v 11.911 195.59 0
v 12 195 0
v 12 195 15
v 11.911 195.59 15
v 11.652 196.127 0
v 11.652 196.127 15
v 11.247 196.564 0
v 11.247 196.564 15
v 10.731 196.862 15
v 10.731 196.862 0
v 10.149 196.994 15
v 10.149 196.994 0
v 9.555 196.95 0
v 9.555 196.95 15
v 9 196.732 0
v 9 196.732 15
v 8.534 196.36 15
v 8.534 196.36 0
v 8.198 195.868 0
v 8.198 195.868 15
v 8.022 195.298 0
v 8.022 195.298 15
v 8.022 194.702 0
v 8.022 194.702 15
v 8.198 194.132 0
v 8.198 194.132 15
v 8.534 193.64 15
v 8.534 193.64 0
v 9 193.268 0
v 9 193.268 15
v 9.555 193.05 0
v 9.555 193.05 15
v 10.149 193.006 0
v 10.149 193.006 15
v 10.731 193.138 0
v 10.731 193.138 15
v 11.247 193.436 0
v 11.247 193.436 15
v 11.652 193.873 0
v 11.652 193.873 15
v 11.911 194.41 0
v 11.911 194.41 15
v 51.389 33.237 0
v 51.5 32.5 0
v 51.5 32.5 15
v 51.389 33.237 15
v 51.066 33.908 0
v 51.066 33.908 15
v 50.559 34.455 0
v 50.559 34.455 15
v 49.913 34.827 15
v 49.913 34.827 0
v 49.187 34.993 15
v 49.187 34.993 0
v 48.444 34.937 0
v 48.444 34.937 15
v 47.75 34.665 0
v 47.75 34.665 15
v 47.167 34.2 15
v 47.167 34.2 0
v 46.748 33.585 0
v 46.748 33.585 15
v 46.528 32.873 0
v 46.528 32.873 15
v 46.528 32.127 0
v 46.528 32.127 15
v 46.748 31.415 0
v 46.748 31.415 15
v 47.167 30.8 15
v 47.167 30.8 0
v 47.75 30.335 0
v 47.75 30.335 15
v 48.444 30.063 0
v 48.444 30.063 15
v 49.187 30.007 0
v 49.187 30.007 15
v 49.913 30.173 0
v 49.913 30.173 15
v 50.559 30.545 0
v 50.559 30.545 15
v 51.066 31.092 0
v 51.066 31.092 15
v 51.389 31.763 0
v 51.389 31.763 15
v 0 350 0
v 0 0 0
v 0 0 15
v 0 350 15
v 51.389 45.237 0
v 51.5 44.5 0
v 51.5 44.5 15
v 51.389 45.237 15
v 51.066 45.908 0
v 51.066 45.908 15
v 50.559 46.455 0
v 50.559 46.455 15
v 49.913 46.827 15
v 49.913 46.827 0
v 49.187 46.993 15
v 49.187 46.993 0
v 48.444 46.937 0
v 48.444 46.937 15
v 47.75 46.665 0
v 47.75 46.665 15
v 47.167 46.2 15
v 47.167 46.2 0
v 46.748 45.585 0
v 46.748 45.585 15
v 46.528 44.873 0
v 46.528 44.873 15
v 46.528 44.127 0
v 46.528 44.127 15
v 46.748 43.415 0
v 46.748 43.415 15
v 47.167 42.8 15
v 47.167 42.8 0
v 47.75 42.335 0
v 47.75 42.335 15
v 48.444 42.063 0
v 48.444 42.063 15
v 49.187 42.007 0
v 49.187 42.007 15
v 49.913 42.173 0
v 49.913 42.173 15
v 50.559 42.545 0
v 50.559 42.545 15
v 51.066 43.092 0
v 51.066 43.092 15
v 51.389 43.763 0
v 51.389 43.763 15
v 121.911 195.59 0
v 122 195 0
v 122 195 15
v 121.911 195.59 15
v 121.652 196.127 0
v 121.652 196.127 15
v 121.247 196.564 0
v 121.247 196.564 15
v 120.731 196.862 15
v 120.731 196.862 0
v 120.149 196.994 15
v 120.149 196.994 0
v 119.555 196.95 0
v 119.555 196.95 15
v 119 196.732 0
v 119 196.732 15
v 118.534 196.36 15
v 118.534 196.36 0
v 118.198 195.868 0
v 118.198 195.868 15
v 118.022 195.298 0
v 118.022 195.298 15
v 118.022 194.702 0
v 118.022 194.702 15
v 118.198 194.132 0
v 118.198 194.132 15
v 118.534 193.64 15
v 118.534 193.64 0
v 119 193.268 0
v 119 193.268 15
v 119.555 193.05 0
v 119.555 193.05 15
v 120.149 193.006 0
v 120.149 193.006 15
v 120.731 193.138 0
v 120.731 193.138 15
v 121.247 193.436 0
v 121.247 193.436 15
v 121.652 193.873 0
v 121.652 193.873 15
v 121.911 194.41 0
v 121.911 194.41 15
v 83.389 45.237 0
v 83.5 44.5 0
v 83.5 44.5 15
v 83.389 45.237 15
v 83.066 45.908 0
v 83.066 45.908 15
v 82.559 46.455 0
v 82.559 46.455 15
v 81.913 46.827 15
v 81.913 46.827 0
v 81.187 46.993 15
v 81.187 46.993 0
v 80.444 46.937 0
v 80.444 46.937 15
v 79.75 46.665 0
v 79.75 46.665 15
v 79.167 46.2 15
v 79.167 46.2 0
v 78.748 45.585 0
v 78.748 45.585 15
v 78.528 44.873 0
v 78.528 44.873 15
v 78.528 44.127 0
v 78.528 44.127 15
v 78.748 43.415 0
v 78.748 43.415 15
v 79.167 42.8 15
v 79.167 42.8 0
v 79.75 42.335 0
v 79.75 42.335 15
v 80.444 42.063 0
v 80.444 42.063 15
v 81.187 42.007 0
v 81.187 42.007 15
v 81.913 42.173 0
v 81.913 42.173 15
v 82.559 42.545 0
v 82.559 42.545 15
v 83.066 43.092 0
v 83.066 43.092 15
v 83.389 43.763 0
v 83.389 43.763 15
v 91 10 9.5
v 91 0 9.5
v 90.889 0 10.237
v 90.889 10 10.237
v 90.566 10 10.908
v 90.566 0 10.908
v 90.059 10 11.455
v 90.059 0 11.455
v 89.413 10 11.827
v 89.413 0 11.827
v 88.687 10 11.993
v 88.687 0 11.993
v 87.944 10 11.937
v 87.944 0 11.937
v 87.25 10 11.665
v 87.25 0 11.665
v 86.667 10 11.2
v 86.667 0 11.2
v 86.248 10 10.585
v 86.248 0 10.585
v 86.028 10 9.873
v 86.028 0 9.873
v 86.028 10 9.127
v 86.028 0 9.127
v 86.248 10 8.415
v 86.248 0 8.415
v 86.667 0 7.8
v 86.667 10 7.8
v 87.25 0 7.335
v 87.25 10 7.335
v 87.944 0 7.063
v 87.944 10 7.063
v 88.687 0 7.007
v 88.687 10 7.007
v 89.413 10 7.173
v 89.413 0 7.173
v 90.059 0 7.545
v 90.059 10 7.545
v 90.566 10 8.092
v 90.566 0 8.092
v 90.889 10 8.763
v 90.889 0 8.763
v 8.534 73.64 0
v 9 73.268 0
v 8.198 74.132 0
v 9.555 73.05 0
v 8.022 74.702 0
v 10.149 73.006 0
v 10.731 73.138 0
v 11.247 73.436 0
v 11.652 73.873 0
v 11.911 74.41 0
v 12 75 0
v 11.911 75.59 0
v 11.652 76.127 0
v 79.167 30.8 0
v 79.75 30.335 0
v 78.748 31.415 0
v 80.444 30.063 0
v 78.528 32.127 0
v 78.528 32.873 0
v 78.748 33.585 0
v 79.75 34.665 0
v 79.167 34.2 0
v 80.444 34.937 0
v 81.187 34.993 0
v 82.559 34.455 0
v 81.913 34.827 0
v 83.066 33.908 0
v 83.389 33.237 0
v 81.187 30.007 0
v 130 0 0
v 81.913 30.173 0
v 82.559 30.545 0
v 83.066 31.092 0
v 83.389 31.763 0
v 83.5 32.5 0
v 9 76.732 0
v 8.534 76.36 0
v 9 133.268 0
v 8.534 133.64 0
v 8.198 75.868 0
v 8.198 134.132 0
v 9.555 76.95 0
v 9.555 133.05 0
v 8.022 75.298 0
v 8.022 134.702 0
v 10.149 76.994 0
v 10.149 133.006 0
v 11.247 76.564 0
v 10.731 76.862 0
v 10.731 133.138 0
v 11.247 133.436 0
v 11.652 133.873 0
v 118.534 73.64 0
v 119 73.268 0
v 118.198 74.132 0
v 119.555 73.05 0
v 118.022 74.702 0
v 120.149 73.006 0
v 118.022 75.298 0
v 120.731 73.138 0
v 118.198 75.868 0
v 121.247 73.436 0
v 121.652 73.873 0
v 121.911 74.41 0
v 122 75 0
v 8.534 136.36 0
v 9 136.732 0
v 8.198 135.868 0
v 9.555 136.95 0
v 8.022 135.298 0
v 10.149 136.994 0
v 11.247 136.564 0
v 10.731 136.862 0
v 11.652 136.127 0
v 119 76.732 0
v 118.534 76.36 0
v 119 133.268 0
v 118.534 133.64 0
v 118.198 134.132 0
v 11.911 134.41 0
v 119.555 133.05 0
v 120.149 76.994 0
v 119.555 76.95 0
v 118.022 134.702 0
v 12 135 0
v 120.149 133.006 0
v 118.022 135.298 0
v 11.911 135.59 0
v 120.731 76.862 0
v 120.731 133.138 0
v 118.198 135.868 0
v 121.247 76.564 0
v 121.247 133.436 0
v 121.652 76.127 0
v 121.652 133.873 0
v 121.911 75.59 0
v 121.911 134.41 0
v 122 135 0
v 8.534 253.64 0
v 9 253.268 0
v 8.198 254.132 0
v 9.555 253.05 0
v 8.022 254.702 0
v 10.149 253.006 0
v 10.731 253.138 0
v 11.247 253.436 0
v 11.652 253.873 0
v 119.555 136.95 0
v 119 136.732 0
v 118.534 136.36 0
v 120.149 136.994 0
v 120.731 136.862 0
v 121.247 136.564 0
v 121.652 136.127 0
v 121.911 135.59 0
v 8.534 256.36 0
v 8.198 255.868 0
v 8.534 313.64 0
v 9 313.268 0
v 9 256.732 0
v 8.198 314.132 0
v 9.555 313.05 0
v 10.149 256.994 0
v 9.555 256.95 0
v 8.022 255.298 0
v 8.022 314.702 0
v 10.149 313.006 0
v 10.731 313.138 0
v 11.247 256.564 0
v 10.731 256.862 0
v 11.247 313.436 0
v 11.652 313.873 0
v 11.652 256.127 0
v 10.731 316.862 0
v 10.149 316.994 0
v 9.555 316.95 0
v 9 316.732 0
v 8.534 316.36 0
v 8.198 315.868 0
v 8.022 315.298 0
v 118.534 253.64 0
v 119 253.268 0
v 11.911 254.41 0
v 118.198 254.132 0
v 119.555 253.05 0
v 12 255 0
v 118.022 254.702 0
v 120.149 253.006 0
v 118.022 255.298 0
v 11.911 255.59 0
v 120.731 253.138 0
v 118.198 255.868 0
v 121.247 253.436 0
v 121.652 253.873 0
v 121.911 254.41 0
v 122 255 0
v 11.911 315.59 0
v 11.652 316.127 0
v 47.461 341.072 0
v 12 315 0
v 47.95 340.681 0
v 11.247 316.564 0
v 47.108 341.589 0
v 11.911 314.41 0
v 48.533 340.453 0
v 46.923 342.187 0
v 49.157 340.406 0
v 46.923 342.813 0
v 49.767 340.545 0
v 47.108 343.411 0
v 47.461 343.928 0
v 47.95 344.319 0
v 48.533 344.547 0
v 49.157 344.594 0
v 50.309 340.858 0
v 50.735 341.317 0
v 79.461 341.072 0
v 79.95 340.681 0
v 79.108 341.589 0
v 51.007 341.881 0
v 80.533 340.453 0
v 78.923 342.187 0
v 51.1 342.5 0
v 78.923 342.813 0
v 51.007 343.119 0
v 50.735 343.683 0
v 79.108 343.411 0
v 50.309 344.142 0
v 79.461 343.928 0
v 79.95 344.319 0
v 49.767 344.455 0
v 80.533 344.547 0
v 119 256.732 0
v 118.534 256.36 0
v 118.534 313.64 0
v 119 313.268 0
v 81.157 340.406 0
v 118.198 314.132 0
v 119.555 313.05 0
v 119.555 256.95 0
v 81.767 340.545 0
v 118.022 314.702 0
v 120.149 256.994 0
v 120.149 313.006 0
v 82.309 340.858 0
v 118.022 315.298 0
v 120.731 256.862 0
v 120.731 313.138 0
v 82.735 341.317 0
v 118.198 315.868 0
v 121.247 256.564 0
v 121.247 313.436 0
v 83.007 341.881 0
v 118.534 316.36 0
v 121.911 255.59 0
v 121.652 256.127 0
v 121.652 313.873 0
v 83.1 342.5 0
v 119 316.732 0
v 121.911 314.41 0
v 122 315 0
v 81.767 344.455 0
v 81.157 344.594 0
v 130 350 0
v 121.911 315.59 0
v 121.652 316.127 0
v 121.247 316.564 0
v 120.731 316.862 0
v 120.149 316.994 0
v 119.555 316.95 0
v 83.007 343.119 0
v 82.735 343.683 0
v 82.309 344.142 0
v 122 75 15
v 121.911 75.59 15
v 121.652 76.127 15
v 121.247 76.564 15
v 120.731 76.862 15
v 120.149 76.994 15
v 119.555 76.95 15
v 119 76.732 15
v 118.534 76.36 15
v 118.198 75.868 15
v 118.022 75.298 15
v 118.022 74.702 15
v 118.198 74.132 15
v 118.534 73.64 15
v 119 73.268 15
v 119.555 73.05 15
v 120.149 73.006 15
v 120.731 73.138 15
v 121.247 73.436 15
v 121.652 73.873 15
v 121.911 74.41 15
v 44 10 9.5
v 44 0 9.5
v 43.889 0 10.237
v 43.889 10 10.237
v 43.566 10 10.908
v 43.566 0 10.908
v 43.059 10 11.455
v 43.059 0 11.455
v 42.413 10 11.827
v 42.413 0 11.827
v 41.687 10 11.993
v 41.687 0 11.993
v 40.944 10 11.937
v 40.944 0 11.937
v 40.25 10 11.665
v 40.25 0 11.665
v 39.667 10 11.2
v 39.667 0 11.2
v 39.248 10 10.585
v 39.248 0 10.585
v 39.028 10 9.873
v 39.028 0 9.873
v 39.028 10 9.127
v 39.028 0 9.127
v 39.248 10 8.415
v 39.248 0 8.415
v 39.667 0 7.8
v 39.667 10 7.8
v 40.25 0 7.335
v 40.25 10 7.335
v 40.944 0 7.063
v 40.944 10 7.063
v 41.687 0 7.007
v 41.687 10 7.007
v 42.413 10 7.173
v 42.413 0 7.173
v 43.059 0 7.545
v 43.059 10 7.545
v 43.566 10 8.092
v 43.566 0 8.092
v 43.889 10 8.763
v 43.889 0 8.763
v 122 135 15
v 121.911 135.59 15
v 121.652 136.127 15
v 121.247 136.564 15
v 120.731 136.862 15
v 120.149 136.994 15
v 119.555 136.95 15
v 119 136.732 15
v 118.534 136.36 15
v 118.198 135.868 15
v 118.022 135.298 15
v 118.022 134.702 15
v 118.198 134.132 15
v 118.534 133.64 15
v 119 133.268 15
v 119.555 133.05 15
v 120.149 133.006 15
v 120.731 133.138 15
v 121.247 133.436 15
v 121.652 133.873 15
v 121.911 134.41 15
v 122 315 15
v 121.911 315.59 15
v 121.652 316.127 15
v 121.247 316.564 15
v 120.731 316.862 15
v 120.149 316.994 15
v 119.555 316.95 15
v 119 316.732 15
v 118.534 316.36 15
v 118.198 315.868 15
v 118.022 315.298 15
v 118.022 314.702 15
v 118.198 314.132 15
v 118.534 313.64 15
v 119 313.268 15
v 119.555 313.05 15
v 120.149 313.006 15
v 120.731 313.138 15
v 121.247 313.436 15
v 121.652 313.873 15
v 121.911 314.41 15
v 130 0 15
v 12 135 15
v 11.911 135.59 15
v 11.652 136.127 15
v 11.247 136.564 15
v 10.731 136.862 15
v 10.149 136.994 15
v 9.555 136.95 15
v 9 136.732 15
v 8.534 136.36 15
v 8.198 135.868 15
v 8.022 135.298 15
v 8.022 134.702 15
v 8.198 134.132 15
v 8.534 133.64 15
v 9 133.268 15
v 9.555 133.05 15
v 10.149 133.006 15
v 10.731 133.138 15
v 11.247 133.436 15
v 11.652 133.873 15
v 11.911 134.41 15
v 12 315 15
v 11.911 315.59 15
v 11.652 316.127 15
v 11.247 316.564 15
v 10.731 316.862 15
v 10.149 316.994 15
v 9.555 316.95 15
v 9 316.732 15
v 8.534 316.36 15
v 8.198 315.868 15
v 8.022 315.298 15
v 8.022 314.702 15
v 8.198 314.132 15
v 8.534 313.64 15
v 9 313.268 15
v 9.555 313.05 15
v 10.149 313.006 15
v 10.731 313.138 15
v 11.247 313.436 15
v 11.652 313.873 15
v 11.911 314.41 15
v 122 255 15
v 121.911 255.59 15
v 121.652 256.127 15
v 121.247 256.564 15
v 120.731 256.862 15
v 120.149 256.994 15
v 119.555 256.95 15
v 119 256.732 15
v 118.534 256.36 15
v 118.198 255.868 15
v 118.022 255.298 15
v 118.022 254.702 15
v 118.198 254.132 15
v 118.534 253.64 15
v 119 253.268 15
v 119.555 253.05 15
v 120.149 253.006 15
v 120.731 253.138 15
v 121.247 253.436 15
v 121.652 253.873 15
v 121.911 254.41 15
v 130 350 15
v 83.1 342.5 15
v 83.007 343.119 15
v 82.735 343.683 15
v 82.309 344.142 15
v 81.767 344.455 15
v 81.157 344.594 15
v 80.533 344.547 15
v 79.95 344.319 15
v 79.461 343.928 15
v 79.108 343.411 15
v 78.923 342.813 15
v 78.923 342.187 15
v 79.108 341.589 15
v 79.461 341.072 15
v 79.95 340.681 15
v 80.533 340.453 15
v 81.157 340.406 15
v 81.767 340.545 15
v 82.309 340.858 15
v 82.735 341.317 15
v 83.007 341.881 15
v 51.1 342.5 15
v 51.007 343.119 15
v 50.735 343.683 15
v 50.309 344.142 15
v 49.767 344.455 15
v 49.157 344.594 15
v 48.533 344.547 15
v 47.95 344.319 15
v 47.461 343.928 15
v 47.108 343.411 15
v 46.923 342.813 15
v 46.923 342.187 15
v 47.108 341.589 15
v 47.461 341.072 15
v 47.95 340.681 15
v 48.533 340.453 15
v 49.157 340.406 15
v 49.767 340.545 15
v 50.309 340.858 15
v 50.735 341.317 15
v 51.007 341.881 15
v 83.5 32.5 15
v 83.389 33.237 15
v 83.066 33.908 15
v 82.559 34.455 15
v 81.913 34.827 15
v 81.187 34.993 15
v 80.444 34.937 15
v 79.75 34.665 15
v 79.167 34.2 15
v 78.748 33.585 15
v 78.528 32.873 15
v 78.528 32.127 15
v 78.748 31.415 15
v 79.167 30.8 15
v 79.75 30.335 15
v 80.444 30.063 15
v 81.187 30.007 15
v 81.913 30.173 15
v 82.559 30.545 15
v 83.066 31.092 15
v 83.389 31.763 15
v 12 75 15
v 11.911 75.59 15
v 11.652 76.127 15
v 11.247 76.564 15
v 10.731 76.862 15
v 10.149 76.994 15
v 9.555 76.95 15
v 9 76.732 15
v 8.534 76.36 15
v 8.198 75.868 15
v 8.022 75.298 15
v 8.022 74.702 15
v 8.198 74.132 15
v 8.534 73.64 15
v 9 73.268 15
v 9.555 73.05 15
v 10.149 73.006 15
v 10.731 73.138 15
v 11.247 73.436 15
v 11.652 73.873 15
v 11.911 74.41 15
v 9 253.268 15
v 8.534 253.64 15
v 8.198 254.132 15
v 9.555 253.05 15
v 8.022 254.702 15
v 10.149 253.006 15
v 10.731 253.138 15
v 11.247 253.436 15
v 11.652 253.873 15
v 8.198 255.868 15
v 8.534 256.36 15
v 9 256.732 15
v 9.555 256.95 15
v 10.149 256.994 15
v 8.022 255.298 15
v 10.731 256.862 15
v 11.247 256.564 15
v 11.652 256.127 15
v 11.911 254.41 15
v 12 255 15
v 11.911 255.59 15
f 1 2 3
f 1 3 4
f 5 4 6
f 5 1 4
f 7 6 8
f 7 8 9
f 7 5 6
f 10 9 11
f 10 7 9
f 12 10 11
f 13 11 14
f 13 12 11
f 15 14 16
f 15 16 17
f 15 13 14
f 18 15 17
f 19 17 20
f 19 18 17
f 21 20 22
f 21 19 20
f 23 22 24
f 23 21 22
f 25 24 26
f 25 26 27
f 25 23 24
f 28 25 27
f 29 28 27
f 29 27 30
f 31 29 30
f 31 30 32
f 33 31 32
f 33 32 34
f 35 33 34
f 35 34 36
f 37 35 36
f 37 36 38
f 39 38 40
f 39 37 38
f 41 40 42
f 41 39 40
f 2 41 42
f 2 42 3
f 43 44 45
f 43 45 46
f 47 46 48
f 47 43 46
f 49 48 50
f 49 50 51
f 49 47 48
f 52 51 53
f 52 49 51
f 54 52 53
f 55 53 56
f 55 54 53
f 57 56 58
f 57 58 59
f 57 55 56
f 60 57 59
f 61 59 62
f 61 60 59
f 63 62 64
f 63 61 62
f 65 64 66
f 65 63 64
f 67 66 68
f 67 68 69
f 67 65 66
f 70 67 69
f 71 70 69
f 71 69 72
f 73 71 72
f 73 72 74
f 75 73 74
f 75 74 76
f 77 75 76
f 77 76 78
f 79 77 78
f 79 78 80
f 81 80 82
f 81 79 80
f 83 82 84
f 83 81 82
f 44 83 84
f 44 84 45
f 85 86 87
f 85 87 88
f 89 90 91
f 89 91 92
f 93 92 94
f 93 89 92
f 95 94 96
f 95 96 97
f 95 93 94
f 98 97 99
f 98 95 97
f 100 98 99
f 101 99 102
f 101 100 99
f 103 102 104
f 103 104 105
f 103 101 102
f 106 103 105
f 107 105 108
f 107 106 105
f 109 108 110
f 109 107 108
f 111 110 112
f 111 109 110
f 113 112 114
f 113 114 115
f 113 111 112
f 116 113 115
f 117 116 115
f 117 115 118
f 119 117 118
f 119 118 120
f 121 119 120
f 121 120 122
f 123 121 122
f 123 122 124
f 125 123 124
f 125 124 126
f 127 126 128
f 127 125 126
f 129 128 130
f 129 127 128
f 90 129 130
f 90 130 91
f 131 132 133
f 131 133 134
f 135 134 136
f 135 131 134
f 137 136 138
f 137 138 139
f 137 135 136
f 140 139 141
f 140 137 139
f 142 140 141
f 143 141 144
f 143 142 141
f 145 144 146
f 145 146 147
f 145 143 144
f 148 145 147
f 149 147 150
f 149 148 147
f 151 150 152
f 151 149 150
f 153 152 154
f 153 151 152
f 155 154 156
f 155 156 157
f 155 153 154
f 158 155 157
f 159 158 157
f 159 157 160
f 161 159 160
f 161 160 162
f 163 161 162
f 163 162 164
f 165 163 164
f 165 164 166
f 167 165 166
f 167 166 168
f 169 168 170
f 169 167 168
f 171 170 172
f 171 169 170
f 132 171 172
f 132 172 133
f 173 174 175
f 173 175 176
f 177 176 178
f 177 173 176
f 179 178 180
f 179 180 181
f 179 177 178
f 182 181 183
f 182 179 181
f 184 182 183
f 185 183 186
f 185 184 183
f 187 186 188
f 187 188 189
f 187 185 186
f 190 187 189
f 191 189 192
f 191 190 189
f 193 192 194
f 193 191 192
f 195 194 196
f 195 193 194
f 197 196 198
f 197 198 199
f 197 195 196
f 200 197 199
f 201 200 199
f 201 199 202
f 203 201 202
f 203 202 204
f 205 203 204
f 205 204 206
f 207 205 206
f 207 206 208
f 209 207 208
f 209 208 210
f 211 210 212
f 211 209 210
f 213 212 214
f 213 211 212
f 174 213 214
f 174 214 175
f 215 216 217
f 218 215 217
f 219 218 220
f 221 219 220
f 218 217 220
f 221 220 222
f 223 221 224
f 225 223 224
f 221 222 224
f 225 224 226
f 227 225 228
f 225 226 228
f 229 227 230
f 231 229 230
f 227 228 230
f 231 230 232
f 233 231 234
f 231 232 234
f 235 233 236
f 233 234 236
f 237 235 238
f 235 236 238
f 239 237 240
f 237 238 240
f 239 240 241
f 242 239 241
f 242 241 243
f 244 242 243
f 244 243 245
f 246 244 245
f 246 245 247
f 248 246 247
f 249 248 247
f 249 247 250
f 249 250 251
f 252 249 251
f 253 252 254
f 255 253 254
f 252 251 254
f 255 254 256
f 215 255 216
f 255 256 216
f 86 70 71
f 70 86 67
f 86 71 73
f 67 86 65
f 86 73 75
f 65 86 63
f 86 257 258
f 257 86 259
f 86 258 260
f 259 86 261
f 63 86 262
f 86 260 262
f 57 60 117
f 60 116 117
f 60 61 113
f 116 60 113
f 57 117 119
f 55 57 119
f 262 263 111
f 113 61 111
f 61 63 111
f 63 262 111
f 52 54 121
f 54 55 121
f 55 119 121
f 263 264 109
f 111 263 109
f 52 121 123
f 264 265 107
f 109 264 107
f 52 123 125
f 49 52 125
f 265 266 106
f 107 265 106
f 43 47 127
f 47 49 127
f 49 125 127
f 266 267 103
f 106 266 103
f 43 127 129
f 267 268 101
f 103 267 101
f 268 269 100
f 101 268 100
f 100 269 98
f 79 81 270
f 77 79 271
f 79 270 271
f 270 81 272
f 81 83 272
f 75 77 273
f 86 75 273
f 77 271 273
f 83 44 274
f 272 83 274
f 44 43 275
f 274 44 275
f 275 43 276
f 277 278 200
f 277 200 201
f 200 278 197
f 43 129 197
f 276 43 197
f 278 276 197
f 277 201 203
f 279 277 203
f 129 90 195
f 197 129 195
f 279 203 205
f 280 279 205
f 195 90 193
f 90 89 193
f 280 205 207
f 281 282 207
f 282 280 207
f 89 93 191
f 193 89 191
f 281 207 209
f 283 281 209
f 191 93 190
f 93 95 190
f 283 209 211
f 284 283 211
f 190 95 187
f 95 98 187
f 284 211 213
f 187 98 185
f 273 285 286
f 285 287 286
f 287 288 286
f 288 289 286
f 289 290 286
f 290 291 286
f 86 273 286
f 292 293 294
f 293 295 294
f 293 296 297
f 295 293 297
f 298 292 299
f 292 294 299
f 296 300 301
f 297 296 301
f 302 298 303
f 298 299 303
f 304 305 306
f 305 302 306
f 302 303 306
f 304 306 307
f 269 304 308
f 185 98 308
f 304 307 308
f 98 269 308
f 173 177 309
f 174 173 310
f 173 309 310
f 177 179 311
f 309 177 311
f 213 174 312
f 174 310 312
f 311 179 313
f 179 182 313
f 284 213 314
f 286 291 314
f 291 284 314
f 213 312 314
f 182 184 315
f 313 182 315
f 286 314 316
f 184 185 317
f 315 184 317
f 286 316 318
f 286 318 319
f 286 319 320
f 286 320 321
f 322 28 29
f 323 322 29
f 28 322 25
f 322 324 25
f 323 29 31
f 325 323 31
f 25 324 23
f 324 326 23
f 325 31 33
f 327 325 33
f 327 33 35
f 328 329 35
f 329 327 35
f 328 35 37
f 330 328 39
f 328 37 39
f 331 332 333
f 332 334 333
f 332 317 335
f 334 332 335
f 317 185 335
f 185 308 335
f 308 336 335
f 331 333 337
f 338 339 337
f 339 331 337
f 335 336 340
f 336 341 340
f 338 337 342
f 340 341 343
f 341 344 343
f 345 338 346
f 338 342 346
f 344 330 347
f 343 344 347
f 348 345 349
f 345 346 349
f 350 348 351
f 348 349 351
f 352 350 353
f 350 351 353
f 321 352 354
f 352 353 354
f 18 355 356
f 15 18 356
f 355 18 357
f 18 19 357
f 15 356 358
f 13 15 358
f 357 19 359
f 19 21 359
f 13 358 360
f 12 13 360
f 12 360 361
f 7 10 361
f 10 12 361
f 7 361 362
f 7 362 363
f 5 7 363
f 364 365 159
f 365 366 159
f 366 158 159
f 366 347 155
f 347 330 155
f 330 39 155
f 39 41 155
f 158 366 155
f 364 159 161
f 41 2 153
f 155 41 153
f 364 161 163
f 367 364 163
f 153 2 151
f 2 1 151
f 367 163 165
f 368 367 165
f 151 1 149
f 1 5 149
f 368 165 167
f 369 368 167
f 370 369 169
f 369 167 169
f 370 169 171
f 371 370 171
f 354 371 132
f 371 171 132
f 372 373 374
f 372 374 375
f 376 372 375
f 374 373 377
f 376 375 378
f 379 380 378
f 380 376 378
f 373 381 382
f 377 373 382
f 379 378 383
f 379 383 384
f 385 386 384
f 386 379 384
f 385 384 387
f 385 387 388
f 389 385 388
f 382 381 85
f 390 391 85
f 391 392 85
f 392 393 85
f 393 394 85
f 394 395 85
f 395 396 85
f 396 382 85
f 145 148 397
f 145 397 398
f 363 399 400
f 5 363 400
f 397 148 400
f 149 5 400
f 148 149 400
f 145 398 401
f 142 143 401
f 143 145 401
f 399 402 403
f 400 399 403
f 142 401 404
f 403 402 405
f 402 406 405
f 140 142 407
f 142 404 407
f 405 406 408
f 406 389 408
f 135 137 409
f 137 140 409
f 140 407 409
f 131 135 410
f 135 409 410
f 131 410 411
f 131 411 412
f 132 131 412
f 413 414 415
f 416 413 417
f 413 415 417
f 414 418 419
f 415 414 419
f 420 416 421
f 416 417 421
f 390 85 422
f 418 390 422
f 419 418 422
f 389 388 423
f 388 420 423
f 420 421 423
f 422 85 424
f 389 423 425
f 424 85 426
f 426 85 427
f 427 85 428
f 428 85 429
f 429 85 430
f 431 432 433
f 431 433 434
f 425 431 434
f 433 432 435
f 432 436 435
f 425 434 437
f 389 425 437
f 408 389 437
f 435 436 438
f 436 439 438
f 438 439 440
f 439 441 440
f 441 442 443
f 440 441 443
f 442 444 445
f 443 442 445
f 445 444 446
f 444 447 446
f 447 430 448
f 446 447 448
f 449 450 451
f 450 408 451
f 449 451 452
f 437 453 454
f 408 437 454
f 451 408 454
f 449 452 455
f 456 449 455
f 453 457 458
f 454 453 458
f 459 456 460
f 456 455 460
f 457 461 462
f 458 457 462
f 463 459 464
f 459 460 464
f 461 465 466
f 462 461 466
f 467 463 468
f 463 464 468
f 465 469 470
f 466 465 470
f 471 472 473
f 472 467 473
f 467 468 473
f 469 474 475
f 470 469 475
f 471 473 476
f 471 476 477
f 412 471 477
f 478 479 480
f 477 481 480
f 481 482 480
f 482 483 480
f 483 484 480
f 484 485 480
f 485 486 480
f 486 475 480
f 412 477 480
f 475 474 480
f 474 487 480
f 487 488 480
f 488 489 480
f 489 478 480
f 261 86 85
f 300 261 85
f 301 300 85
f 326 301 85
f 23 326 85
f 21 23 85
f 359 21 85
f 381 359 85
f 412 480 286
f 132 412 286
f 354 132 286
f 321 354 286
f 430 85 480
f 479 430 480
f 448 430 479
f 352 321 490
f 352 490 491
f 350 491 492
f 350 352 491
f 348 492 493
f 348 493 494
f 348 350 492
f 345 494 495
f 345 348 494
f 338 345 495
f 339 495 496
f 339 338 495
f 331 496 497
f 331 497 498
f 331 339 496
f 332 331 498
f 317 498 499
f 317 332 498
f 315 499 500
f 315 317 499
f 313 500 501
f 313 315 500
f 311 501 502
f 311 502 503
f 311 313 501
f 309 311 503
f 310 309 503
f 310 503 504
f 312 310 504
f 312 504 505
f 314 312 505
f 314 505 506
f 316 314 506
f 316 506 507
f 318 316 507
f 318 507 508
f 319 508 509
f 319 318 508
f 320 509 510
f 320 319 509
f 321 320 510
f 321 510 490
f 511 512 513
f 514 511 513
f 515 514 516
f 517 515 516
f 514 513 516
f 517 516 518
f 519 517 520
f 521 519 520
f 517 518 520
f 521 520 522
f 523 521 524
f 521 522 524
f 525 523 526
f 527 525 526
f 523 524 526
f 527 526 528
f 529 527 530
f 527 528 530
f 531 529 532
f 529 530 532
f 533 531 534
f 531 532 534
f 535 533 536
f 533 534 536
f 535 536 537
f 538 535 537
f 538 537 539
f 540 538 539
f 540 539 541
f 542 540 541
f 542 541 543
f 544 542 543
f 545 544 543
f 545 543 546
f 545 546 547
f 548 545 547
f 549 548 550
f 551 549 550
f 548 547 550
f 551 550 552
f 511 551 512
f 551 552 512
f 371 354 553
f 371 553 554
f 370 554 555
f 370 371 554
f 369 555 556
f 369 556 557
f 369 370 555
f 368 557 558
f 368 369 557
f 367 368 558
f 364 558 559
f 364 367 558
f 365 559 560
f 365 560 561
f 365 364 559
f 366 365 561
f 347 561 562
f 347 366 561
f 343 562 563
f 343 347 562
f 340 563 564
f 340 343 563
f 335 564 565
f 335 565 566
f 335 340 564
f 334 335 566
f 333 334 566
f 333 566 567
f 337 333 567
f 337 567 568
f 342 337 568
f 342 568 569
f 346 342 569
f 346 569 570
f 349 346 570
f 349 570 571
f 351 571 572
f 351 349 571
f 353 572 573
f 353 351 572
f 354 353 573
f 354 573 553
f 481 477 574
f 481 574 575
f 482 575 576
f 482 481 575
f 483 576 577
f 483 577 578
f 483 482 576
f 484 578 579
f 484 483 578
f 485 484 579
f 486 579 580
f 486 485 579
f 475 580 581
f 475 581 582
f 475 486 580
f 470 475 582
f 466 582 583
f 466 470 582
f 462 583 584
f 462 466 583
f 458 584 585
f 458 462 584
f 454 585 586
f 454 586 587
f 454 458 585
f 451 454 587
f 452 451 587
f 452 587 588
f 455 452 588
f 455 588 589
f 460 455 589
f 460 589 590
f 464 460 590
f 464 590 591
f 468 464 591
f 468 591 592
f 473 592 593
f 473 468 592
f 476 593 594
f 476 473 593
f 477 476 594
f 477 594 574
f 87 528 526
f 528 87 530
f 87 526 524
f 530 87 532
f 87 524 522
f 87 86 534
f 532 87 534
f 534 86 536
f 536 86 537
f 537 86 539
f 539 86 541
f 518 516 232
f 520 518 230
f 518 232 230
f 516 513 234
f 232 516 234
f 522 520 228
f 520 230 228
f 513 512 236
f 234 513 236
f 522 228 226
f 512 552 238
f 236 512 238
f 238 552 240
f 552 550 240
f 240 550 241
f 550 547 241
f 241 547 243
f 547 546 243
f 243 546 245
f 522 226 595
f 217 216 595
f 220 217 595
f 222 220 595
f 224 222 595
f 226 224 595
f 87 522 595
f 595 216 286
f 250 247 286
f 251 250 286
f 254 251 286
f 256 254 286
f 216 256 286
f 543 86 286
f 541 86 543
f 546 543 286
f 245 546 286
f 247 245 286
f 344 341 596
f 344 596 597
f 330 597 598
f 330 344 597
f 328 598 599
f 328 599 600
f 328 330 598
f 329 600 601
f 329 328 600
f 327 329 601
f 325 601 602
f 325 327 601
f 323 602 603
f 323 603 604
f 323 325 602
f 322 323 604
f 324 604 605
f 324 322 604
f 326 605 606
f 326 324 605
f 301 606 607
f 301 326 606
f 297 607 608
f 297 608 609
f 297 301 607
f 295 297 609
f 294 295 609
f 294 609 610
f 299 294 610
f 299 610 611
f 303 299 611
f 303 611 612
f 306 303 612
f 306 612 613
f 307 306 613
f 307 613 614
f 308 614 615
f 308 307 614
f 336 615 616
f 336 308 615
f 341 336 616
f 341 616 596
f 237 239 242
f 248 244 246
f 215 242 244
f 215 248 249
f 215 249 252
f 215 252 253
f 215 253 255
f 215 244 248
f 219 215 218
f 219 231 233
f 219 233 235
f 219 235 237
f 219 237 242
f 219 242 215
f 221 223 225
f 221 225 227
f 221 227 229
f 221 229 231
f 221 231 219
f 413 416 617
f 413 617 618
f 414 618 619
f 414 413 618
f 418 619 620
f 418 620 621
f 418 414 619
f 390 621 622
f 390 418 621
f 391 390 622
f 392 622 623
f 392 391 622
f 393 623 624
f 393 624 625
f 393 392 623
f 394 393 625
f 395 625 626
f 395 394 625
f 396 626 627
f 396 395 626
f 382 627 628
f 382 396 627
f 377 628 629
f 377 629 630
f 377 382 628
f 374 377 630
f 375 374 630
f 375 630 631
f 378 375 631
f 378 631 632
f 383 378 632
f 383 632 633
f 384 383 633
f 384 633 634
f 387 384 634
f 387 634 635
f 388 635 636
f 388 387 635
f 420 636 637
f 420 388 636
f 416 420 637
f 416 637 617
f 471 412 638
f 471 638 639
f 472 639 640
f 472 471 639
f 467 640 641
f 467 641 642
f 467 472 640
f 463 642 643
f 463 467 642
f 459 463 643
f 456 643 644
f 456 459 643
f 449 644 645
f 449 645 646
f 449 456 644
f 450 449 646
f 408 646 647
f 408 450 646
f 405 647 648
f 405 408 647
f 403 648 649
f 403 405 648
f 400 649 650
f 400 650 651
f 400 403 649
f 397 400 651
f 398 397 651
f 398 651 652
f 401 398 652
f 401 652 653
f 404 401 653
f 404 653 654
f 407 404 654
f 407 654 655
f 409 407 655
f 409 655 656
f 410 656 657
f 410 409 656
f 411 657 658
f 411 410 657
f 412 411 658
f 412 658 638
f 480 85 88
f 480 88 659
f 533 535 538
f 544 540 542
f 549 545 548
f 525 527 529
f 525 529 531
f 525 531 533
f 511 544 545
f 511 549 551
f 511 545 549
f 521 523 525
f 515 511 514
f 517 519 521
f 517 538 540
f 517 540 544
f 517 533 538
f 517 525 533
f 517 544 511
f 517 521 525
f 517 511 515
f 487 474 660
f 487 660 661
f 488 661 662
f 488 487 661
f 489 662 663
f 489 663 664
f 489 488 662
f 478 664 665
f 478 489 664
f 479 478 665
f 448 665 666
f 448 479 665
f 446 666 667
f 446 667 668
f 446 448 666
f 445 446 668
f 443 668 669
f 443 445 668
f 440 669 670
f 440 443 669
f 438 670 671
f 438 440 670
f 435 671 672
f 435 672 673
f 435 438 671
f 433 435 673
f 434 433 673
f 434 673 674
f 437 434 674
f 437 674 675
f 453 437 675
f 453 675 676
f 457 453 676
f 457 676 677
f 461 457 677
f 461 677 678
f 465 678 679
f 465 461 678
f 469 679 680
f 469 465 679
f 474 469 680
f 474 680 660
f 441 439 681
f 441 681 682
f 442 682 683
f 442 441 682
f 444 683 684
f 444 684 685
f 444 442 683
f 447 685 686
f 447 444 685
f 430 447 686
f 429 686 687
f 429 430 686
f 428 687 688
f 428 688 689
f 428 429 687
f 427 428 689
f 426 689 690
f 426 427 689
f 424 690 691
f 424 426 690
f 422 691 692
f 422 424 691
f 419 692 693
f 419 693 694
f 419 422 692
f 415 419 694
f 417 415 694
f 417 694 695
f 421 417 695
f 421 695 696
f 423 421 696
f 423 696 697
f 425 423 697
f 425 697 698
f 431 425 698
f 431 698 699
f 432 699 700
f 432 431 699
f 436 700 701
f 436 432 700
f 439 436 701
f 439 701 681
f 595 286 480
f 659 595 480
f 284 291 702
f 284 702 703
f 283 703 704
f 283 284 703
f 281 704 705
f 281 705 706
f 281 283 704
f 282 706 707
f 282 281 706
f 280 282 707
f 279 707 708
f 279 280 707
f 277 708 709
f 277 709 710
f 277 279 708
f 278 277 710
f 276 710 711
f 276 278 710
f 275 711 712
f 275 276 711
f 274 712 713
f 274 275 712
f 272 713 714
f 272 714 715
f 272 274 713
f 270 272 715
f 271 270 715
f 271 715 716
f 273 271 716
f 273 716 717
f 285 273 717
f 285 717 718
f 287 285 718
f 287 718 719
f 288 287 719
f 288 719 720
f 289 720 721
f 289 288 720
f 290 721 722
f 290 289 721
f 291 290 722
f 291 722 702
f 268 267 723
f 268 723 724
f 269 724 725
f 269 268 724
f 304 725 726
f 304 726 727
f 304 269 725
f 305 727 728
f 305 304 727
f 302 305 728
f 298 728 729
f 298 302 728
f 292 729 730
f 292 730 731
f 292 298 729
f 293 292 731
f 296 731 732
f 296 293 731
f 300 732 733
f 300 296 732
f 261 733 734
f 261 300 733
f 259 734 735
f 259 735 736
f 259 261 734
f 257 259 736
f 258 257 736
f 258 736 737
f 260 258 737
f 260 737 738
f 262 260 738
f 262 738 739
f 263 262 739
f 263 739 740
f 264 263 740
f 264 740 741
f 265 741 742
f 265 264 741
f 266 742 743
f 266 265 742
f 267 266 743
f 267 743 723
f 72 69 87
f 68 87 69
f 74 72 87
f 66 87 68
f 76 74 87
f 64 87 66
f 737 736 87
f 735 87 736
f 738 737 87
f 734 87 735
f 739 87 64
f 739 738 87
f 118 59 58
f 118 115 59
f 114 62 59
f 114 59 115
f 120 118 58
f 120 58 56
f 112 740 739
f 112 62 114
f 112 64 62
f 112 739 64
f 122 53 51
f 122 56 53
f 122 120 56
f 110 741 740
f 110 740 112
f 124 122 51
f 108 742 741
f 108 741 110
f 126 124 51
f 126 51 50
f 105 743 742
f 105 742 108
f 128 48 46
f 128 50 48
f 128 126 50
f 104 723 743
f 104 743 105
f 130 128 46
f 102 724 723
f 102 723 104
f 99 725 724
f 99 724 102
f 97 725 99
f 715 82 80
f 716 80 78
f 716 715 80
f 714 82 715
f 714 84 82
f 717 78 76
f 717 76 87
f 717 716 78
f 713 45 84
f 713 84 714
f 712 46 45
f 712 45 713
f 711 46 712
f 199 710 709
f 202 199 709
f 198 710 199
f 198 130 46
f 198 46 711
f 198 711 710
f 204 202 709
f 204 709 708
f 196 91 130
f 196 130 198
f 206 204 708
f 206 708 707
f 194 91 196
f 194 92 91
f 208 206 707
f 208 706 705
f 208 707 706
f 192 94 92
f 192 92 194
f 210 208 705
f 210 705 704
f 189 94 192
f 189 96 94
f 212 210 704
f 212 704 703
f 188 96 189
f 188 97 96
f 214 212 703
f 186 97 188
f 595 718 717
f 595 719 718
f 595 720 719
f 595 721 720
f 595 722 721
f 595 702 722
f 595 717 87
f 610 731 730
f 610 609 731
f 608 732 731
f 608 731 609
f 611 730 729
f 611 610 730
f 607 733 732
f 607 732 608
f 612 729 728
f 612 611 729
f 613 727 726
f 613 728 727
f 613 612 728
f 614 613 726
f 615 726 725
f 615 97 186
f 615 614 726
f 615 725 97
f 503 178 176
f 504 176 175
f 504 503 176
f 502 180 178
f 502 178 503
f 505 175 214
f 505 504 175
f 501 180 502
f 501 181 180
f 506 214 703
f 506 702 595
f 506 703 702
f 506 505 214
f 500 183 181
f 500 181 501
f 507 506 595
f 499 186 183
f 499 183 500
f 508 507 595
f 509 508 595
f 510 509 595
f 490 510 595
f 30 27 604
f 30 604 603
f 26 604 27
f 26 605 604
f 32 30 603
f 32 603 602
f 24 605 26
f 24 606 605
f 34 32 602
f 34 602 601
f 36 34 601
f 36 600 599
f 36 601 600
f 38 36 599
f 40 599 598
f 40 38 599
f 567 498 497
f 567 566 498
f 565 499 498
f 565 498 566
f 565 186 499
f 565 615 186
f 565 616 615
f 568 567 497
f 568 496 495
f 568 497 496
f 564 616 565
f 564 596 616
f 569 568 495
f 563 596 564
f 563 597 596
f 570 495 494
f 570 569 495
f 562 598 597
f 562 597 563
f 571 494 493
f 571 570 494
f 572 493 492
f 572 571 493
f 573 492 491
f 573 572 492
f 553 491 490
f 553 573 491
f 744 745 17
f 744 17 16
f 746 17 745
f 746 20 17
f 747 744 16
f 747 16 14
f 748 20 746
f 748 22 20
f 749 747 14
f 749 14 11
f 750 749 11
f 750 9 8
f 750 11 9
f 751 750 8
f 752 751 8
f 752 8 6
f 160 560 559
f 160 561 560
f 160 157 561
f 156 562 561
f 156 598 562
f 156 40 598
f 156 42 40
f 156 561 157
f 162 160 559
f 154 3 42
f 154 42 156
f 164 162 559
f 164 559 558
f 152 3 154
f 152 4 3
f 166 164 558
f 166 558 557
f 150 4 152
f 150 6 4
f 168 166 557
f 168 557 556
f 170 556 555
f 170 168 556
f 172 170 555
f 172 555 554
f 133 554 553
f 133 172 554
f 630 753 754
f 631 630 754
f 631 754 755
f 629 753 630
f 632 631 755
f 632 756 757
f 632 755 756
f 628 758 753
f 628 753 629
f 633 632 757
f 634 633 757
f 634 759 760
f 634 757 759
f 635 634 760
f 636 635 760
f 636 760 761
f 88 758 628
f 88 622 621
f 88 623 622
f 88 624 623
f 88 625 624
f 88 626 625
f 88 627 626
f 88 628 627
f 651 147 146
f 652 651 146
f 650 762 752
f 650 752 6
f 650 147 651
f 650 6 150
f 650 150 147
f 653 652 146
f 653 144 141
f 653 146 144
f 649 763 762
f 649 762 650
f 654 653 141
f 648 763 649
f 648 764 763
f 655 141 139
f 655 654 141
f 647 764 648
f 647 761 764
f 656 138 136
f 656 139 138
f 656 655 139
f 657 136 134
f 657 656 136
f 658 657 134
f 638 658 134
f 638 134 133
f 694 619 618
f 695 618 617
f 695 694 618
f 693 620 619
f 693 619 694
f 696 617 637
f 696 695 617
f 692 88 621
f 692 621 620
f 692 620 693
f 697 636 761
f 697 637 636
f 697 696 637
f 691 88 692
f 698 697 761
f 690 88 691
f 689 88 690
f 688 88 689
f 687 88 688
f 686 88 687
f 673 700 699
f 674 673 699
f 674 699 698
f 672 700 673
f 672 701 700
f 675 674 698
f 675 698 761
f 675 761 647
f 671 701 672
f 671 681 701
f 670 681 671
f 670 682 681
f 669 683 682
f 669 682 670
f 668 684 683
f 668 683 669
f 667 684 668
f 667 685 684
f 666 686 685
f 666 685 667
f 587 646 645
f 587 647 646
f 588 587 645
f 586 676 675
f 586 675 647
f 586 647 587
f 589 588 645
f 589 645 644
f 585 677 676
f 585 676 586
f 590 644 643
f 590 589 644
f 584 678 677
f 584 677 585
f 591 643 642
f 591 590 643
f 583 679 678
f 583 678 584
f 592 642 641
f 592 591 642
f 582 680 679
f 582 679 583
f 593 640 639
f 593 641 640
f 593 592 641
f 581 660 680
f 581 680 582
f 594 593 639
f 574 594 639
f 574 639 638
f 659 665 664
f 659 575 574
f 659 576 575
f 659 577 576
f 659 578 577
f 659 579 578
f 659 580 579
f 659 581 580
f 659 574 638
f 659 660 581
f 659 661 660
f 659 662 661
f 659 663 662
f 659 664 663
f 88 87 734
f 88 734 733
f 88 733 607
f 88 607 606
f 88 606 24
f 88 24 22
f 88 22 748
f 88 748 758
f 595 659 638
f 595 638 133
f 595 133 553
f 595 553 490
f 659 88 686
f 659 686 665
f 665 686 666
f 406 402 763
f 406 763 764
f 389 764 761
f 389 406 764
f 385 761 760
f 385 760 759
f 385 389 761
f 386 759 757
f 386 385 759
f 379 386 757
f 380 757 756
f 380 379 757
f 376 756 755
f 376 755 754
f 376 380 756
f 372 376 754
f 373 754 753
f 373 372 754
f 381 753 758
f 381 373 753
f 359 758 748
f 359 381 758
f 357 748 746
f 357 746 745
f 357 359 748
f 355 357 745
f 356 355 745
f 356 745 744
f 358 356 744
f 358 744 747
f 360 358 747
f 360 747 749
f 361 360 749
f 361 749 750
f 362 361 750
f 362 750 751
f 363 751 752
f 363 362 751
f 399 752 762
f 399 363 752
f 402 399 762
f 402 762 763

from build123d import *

# Parameters (mm, degrees)
SKETCH_W     = 130
SKETCH_H     = 350
SKETCH_R     = 2.1
SKETCH_R_2   = 2.5
SKETCH_R_3   = 2
PAD_DEPTH    = 15
SKETCH001_R  = 2.5
POCKET_DEPTH = 10


with BuildPart() as part:
    # Sketch → Pad (new body)
    with BuildSketch(Plane.XY):
        with Locations((65, 175)):
            Rectangle(SKETCH_W, SKETCH_H)
        with Locations((49, 342.5)):
            Circle(SKETCH_R, mode=Mode.SUBTRACT)
        with Locations((81, 342.5)):
            Circle(SKETCH_R, mode=Mode.SUBTRACT)
        with Locations((49, 44.5)):
            Circle(SKETCH_R_2, mode=Mode.SUBTRACT)
        with Locations((81, 44.5)):
            Circle(SKETCH_R_2, mode=Mode.SUBTRACT)
        with Locations((49, 32.5)):
            Circle(SKETCH_R_2, mode=Mode.SUBTRACT)
        with Locations((81, 32.5)):
            Circle(SKETCH_R_2, mode=Mode.SUBTRACT)
        with Locations((10, 75)):
            Circle(SKETCH_R_3, mode=Mode.SUBTRACT)
        with Locations((10, 135)):
            Circle(SKETCH_R_3, mode=Mode.SUBTRACT)
        with Locations((10, 195)):
            Circle(SKETCH_R_3, mode=Mode.SUBTRACT)
        with Locations((10, 255)):
            Circle(SKETCH_R_3, mode=Mode.SUBTRACT)
        with Locations((10, 315)):
            Circle(SKETCH_R_3, mode=Mode.SUBTRACT)
        with Locations((120, 75)):
            Circle(SKETCH_R_3, mode=Mode.SUBTRACT)
        with Locations((120, 135)):
            Circle(SKETCH_R_3, mode=Mode.SUBTRACT)
        with Locations((120, 195)):
            Circle(SKETCH_R_3, mode=Mode.SUBTRACT)
        with Locations((120, 255)):
            Circle(SKETCH_R_3, mode=Mode.SUBTRACT)
        with Locations((120, 315)):
            Circle(SKETCH_R_3, mode=Mode.SUBTRACT)
    extrude(amount=PAD_DEPTH)

    # Sketch001 (on Face1 of Pad) → Pocket (cut)
    with BuildSketch(Plane.XZ):
        with Locations((41.5, 9.5)):
            Circle(SKETCH001_R)
        with Locations((88.5, 9.5)):
            Circle(SKETCH001_R)
    extrude(amount=-POCKET_DEPTH, mode=Mode.SUBTRACT)


solid = part.part
